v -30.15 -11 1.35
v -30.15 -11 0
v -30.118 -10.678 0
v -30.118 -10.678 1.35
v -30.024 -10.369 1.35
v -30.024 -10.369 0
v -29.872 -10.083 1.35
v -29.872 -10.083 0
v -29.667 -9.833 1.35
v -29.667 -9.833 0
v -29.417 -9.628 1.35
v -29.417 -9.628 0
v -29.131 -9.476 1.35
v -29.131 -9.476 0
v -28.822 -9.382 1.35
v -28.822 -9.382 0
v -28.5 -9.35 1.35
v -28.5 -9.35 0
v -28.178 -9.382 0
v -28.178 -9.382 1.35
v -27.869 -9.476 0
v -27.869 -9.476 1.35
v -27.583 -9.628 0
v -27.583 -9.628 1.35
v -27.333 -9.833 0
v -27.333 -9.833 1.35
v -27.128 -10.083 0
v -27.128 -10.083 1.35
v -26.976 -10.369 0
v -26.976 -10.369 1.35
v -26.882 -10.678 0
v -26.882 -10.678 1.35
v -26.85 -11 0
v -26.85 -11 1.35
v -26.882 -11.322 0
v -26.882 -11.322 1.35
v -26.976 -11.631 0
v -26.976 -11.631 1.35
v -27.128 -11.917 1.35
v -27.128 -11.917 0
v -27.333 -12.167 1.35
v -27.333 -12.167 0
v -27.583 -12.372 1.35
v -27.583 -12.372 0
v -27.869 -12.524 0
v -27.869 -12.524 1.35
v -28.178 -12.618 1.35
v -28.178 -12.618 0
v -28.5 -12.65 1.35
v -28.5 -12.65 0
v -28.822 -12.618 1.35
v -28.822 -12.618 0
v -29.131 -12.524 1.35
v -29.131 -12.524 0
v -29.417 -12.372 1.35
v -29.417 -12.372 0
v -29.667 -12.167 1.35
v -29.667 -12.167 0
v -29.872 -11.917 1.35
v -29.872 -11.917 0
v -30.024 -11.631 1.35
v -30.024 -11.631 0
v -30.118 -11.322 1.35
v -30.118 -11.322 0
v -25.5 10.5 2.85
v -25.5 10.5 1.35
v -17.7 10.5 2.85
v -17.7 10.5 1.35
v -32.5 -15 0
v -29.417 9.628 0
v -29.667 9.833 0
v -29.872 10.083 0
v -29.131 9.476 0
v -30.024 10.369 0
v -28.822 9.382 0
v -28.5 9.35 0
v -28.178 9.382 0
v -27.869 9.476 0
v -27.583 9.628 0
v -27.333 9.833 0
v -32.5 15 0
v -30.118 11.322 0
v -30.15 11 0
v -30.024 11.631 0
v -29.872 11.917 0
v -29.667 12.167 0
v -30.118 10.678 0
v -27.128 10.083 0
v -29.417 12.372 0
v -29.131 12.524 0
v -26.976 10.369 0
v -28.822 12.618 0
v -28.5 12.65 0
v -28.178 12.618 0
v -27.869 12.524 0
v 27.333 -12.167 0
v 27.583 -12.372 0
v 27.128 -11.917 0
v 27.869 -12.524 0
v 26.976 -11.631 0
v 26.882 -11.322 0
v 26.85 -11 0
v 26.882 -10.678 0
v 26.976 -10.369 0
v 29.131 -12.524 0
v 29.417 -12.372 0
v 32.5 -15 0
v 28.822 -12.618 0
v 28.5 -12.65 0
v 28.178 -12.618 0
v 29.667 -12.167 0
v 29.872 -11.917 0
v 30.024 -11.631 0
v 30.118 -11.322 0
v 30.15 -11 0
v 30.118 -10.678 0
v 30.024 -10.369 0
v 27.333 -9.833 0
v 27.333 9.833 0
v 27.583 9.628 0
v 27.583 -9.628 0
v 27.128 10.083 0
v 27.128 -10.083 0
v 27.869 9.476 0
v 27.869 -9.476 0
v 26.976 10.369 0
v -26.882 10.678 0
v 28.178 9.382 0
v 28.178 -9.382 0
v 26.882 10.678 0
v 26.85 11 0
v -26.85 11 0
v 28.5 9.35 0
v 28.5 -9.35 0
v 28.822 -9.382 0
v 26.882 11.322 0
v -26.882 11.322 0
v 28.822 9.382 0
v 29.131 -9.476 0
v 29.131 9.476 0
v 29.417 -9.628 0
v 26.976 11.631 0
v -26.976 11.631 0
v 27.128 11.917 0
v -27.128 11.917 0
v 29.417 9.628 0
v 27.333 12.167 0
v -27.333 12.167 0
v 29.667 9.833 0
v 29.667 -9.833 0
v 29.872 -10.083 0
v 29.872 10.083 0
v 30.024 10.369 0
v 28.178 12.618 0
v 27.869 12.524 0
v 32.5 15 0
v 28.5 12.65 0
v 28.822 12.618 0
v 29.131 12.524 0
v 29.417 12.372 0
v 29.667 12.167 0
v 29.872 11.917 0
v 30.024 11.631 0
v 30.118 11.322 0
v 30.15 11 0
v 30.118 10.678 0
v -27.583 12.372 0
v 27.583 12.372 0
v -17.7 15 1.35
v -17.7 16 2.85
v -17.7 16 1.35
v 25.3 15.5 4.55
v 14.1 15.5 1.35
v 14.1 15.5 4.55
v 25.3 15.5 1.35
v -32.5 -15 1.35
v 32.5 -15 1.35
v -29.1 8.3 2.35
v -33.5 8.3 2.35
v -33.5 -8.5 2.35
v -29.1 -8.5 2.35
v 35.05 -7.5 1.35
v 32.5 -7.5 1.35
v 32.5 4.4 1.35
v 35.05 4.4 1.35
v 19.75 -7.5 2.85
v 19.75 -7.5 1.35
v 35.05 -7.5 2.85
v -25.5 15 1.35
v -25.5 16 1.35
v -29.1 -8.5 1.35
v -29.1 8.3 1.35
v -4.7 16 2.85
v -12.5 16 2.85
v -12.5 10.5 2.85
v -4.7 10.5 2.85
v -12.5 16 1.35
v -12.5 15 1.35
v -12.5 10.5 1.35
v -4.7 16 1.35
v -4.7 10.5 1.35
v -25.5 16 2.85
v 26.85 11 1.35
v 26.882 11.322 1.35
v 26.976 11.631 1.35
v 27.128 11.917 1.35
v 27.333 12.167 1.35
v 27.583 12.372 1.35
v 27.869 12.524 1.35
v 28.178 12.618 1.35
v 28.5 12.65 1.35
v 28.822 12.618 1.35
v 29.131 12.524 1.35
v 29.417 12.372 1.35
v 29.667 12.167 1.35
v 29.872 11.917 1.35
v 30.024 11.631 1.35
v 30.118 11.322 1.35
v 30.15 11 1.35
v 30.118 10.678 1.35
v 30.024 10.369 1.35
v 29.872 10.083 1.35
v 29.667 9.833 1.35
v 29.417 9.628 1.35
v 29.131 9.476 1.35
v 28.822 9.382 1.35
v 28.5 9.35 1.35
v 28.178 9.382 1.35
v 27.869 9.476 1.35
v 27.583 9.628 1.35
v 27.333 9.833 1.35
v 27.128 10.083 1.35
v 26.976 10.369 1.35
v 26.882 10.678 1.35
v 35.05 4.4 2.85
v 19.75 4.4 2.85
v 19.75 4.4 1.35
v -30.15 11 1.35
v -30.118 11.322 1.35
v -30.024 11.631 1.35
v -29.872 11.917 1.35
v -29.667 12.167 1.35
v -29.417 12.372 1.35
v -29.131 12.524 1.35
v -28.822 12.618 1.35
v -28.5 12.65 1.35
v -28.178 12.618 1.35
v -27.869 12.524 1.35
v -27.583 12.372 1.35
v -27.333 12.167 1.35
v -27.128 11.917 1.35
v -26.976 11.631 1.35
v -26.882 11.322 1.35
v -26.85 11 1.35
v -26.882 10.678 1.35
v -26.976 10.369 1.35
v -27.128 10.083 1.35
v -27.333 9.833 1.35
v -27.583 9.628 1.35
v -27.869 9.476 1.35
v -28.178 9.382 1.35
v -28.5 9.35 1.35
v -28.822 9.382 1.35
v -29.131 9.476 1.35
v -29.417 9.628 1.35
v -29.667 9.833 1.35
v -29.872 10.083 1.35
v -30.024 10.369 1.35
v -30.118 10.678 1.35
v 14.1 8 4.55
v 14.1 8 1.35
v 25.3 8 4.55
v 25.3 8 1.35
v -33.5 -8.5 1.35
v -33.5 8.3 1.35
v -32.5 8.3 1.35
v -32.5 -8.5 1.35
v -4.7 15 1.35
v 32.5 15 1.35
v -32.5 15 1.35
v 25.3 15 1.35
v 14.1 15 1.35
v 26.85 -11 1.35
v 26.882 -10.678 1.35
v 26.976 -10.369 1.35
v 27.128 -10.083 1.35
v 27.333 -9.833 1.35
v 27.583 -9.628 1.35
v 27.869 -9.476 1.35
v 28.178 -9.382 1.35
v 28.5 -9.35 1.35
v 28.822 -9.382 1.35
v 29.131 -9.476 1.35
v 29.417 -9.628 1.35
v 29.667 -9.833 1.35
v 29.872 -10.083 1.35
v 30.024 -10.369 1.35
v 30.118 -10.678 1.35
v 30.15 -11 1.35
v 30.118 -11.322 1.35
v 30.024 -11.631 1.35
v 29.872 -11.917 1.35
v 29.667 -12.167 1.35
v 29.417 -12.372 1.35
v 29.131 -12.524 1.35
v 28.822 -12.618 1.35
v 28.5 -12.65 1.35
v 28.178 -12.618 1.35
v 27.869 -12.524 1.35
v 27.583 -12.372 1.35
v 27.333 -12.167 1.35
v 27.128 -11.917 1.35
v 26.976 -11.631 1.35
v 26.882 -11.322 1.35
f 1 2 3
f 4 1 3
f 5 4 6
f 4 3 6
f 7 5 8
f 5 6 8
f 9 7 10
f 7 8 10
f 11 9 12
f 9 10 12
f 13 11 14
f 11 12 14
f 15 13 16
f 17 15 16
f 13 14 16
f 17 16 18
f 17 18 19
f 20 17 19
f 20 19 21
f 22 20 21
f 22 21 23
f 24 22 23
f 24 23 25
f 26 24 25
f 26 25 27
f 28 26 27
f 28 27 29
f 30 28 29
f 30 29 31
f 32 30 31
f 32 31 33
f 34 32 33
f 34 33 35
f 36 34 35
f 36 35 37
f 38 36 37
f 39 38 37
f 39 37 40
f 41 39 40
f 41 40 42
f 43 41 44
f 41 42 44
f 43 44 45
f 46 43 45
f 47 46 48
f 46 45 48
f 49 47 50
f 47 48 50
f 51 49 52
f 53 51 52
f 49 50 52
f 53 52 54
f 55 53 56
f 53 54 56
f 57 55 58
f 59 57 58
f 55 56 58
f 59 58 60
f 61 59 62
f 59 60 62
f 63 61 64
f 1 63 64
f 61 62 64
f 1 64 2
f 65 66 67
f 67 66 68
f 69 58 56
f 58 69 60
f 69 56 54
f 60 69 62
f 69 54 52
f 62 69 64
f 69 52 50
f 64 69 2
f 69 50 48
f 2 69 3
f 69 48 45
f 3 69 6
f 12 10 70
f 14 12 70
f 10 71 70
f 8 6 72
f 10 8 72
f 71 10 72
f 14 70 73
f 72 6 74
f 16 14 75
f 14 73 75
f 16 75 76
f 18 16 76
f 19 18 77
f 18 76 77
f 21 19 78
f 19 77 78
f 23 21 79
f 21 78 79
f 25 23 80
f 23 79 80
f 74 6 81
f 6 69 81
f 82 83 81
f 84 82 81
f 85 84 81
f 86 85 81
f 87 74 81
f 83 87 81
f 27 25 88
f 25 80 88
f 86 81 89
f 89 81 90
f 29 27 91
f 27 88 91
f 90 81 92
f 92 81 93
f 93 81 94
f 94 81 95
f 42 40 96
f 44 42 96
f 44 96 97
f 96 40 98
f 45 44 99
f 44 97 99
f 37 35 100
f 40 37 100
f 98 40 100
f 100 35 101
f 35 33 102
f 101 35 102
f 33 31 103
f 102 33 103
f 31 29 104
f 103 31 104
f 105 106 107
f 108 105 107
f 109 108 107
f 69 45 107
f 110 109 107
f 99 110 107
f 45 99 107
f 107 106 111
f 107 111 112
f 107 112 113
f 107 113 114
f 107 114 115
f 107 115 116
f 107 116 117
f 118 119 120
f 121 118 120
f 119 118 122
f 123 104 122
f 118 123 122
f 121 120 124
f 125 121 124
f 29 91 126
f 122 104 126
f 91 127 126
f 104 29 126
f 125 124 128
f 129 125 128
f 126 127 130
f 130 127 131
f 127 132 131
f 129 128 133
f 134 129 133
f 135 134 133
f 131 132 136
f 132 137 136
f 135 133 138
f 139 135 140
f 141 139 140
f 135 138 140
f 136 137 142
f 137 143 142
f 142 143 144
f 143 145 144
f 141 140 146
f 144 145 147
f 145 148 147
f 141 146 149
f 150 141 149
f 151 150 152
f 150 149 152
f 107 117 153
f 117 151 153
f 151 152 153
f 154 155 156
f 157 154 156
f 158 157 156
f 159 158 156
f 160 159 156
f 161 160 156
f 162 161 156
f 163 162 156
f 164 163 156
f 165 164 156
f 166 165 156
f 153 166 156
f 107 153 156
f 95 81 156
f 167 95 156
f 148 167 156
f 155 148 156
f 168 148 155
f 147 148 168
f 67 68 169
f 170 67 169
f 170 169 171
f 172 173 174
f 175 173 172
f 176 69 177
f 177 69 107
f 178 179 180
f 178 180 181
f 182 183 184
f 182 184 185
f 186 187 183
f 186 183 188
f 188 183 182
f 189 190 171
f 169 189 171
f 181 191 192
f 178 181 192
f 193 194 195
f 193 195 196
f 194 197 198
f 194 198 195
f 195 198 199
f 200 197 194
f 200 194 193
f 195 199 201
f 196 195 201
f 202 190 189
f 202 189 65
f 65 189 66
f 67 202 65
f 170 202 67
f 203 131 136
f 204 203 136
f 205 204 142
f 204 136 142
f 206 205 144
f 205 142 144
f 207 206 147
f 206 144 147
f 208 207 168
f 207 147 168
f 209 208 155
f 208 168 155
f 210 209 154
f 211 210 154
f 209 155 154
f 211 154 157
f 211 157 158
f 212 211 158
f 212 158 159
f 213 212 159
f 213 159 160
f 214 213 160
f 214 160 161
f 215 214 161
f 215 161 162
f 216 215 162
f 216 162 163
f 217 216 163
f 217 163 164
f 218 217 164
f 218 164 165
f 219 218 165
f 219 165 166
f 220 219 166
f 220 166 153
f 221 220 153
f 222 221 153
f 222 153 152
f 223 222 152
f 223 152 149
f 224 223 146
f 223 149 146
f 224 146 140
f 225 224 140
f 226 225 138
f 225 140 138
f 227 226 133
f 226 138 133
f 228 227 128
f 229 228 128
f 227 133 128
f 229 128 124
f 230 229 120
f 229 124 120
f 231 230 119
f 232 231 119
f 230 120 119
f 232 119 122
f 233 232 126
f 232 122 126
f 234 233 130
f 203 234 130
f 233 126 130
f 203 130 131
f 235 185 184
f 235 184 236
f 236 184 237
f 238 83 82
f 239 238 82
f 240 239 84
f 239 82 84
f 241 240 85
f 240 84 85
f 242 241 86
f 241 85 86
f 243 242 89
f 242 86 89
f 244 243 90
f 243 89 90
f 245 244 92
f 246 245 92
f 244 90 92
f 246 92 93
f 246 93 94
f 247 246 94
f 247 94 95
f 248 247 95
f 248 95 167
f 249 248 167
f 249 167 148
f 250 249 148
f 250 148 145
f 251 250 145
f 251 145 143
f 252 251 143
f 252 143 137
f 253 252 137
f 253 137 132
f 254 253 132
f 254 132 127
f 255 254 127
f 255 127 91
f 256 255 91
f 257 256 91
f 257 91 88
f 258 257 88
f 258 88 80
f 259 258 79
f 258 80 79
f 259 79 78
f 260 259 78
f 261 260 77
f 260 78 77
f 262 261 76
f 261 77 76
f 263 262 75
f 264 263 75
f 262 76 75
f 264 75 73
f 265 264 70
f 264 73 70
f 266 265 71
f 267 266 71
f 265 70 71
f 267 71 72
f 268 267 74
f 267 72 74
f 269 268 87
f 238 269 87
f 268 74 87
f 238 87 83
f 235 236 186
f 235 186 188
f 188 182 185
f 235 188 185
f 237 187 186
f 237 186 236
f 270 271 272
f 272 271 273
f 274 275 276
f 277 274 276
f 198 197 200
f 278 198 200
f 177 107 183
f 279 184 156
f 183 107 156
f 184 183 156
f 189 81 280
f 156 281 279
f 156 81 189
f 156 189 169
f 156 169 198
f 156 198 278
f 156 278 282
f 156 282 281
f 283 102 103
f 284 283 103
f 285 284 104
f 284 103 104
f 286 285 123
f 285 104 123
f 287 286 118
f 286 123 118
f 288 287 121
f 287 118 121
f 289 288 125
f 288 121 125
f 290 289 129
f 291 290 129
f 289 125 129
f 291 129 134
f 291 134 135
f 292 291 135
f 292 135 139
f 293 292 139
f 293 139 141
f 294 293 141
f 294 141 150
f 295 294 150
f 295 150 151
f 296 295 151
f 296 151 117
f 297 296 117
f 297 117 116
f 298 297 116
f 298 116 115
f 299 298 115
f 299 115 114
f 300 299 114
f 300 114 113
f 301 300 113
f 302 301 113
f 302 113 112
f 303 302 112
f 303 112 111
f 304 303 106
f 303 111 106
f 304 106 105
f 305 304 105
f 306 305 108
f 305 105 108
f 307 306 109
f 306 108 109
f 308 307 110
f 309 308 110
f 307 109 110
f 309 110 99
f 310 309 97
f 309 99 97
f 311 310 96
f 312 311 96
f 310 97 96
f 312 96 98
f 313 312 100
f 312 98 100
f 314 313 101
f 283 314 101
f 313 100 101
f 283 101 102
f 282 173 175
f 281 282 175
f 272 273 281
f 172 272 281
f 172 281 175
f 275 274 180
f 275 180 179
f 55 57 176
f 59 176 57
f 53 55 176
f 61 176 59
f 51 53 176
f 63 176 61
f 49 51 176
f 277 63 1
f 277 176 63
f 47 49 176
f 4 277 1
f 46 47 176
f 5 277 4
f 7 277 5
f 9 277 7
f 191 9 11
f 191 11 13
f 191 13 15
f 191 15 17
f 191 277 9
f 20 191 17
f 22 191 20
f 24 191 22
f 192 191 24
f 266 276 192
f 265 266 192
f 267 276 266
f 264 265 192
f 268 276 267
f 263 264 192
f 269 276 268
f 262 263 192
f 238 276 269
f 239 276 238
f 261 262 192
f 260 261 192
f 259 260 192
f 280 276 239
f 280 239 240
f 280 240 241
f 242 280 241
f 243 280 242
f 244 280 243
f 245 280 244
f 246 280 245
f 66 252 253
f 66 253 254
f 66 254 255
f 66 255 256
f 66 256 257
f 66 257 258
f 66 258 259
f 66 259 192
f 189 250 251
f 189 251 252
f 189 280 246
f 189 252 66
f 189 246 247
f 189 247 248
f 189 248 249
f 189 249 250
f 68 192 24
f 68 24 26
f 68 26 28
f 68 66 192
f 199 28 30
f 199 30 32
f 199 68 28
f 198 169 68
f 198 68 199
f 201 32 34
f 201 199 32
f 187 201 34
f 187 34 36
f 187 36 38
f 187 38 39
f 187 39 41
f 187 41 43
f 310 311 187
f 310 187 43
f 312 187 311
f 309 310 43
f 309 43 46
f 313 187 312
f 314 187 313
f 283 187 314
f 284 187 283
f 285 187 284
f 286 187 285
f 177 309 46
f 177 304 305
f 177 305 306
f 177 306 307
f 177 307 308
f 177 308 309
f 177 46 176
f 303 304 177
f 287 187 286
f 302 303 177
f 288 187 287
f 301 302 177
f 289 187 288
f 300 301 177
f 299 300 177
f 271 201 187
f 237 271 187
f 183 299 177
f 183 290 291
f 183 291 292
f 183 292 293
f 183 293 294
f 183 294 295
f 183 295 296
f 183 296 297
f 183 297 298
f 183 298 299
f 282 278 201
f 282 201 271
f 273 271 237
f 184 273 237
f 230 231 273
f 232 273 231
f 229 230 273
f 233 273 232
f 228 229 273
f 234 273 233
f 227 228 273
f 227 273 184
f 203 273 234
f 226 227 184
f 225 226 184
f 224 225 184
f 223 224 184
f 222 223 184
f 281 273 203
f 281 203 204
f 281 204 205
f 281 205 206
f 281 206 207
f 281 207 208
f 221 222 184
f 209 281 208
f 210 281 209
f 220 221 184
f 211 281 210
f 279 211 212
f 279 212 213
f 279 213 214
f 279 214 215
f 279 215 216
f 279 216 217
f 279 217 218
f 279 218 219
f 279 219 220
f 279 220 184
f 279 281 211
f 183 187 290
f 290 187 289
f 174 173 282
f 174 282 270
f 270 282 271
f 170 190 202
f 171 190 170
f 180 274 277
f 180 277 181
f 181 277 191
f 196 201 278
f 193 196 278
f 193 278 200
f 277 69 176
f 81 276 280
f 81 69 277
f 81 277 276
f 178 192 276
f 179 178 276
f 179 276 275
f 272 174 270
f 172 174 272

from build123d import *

# Parameters (mm, degrees)
F0_W     = 65
F0_H     = 30
F1_DEPTH = 1.35
F2_W     = 12.75
F2_H     = 11.9
F2_W_2   = 2.55
F3_DEPTH = 1.5
F2_W_3   = 7.8
F2_H_2   = 4.5
F2_H_3   = 1
F4_DEPTH = 1.5
F2_W_4   = 1
F2_H_4   = 16.8
F2_W_5   = 3.4
F5_DEPTH = 1
F2_W_6   = 11.2
F2_H_5   = 0.5
F2_H_6   = 7
F6_DEPTH = 3.2
F7_D     = 3.3
F7_DEPTH = 9
F7_TIP   = 0.9914200214


with BuildPart() as f1:
    # F0 (on Top) → F1 (new body)
    with BuildSketch(Plane.XY):
        Rectangle(F0_W, F0_H)
    extrude(amount=F1_DEPTH)

    # F2 (on face) → F3 (join)
    with BuildSketch(Plane.XY.offset(1.35)):
        with Locations((26.125, -1.55)):
            Rectangle(F2_W, F2_H)
        with Locations((33.775, -1.55)):
            Rectangle(F2_W_2, F2_H)
    extrude(amount=F3_DEPTH)

    # F2 (on face) → F4 (join)
    with BuildSketch(Plane.XY.offset(1.35)):
        with Locations((-21.6, 12.75)):
            Rectangle(F2_W_3, F2_H_2)
        with Locations((-8.6, 15.5)):
            Rectangle(F2_W_3, F2_H_3)
        with Locations((-8.6, 12.75)):
            Rectangle(F2_W_3, F2_H_2)
        with Locations((-21.6, 15.5)):
            Rectangle(F2_W_3, F2_H_3)
    extrude(amount=F4_DEPTH)

    # F2 (on face) → F5 (join)
    with BuildSketch(Plane.XY.offset(1.35)):
        with Locations((-33, -0.1)):
            Rectangle(F2_W_4, F2_H_4)
        with Locations((-30.8, -0.1)):
            Rectangle(F2_W_5, F2_H_4)
    extrude(amount=F5_DEPTH)

    # F2 (on face) → F6 (join)
    with BuildSketch(Plane.XY.offset(1.35)):
        with Locations((19.7, 15.25)):
            Rectangle(F2_W_6, F2_H_5)
        with Locations((19.7, 11.5)):
            Rectangle(F2_W_6, F2_H_6)
    extrude(amount=F6_DEPTH)

    # F7
    with Locations(Plane.XY.offset(1.35)):
        with Locations((28.5, 11), (28.5, -11), (-28.5, 11), (-28.5, -11)):
            Hole(F7_D / 2, depth=F7_DEPTH)
            with Locations((0, 0, -(F7_DEPTH + F7_TIP / 2))):  # 118° drill point
                Cone(0, F7_D / 2, F7_TIP, mode=Mode.SUBTRACT)


solid = f1.part
